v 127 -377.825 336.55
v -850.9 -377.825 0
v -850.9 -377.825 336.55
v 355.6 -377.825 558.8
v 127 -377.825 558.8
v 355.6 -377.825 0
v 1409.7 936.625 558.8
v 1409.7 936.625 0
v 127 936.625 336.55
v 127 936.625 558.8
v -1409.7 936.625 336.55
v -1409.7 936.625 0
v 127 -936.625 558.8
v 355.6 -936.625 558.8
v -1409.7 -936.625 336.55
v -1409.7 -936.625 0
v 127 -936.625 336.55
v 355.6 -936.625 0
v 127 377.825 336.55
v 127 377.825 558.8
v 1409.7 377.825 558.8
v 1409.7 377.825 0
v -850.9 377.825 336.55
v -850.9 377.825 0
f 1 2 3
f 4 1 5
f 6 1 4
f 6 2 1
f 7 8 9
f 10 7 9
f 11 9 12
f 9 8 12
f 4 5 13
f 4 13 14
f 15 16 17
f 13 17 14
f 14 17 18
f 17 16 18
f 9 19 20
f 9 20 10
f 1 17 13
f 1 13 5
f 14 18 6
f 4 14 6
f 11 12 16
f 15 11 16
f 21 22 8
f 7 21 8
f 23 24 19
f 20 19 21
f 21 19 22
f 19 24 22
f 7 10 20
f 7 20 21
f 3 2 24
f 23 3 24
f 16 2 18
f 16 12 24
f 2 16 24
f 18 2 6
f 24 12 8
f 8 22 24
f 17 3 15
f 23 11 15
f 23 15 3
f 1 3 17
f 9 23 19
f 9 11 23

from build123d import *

# Parameters (mm, degrees)
F0_W     = 977.9
F0_H     = 558.8
F4_DEPTH = 336.55
F0_W_2   = 228.6
F0_W_3   = 1282.7
F5_DEPTH = 558.8


# Not quite as in the source:
# - the program builds the solid bodies; features that only make, move or delete a surface that nothing else refers to are left out


with BuildPart() as f4:
    # F0 (on Top) → F4 (new body)
    with BuildSketch(Plane.XY):
        with Locations((-361.95, -657.225)):
            Rectangle(F0_W, F0_H)
        with Locations((-361.95, 657.225)):
            Rectangle(F0_W, F0_H)
        Polygon((-850.9, 936.625), (-1409.7, 936.625), (-1409.7, -936.625), (-850.9, -936.625), (-850.9, -377.825), (-850.9, 377.825), align=None)
    extrude(amount=F4_DEPTH)

    # F0 (on Top) → F5 (join)
    with BuildSketch(Plane.XY):
        with Locations((241.3, -657.225)):
            Rectangle(F0_W_2, F0_H)
        with Locations((768.35, 657.225)):
            Rectangle(F0_W_3, F0_H)
    extrude(amount=F5_DEPTH)


solid = f4.part
